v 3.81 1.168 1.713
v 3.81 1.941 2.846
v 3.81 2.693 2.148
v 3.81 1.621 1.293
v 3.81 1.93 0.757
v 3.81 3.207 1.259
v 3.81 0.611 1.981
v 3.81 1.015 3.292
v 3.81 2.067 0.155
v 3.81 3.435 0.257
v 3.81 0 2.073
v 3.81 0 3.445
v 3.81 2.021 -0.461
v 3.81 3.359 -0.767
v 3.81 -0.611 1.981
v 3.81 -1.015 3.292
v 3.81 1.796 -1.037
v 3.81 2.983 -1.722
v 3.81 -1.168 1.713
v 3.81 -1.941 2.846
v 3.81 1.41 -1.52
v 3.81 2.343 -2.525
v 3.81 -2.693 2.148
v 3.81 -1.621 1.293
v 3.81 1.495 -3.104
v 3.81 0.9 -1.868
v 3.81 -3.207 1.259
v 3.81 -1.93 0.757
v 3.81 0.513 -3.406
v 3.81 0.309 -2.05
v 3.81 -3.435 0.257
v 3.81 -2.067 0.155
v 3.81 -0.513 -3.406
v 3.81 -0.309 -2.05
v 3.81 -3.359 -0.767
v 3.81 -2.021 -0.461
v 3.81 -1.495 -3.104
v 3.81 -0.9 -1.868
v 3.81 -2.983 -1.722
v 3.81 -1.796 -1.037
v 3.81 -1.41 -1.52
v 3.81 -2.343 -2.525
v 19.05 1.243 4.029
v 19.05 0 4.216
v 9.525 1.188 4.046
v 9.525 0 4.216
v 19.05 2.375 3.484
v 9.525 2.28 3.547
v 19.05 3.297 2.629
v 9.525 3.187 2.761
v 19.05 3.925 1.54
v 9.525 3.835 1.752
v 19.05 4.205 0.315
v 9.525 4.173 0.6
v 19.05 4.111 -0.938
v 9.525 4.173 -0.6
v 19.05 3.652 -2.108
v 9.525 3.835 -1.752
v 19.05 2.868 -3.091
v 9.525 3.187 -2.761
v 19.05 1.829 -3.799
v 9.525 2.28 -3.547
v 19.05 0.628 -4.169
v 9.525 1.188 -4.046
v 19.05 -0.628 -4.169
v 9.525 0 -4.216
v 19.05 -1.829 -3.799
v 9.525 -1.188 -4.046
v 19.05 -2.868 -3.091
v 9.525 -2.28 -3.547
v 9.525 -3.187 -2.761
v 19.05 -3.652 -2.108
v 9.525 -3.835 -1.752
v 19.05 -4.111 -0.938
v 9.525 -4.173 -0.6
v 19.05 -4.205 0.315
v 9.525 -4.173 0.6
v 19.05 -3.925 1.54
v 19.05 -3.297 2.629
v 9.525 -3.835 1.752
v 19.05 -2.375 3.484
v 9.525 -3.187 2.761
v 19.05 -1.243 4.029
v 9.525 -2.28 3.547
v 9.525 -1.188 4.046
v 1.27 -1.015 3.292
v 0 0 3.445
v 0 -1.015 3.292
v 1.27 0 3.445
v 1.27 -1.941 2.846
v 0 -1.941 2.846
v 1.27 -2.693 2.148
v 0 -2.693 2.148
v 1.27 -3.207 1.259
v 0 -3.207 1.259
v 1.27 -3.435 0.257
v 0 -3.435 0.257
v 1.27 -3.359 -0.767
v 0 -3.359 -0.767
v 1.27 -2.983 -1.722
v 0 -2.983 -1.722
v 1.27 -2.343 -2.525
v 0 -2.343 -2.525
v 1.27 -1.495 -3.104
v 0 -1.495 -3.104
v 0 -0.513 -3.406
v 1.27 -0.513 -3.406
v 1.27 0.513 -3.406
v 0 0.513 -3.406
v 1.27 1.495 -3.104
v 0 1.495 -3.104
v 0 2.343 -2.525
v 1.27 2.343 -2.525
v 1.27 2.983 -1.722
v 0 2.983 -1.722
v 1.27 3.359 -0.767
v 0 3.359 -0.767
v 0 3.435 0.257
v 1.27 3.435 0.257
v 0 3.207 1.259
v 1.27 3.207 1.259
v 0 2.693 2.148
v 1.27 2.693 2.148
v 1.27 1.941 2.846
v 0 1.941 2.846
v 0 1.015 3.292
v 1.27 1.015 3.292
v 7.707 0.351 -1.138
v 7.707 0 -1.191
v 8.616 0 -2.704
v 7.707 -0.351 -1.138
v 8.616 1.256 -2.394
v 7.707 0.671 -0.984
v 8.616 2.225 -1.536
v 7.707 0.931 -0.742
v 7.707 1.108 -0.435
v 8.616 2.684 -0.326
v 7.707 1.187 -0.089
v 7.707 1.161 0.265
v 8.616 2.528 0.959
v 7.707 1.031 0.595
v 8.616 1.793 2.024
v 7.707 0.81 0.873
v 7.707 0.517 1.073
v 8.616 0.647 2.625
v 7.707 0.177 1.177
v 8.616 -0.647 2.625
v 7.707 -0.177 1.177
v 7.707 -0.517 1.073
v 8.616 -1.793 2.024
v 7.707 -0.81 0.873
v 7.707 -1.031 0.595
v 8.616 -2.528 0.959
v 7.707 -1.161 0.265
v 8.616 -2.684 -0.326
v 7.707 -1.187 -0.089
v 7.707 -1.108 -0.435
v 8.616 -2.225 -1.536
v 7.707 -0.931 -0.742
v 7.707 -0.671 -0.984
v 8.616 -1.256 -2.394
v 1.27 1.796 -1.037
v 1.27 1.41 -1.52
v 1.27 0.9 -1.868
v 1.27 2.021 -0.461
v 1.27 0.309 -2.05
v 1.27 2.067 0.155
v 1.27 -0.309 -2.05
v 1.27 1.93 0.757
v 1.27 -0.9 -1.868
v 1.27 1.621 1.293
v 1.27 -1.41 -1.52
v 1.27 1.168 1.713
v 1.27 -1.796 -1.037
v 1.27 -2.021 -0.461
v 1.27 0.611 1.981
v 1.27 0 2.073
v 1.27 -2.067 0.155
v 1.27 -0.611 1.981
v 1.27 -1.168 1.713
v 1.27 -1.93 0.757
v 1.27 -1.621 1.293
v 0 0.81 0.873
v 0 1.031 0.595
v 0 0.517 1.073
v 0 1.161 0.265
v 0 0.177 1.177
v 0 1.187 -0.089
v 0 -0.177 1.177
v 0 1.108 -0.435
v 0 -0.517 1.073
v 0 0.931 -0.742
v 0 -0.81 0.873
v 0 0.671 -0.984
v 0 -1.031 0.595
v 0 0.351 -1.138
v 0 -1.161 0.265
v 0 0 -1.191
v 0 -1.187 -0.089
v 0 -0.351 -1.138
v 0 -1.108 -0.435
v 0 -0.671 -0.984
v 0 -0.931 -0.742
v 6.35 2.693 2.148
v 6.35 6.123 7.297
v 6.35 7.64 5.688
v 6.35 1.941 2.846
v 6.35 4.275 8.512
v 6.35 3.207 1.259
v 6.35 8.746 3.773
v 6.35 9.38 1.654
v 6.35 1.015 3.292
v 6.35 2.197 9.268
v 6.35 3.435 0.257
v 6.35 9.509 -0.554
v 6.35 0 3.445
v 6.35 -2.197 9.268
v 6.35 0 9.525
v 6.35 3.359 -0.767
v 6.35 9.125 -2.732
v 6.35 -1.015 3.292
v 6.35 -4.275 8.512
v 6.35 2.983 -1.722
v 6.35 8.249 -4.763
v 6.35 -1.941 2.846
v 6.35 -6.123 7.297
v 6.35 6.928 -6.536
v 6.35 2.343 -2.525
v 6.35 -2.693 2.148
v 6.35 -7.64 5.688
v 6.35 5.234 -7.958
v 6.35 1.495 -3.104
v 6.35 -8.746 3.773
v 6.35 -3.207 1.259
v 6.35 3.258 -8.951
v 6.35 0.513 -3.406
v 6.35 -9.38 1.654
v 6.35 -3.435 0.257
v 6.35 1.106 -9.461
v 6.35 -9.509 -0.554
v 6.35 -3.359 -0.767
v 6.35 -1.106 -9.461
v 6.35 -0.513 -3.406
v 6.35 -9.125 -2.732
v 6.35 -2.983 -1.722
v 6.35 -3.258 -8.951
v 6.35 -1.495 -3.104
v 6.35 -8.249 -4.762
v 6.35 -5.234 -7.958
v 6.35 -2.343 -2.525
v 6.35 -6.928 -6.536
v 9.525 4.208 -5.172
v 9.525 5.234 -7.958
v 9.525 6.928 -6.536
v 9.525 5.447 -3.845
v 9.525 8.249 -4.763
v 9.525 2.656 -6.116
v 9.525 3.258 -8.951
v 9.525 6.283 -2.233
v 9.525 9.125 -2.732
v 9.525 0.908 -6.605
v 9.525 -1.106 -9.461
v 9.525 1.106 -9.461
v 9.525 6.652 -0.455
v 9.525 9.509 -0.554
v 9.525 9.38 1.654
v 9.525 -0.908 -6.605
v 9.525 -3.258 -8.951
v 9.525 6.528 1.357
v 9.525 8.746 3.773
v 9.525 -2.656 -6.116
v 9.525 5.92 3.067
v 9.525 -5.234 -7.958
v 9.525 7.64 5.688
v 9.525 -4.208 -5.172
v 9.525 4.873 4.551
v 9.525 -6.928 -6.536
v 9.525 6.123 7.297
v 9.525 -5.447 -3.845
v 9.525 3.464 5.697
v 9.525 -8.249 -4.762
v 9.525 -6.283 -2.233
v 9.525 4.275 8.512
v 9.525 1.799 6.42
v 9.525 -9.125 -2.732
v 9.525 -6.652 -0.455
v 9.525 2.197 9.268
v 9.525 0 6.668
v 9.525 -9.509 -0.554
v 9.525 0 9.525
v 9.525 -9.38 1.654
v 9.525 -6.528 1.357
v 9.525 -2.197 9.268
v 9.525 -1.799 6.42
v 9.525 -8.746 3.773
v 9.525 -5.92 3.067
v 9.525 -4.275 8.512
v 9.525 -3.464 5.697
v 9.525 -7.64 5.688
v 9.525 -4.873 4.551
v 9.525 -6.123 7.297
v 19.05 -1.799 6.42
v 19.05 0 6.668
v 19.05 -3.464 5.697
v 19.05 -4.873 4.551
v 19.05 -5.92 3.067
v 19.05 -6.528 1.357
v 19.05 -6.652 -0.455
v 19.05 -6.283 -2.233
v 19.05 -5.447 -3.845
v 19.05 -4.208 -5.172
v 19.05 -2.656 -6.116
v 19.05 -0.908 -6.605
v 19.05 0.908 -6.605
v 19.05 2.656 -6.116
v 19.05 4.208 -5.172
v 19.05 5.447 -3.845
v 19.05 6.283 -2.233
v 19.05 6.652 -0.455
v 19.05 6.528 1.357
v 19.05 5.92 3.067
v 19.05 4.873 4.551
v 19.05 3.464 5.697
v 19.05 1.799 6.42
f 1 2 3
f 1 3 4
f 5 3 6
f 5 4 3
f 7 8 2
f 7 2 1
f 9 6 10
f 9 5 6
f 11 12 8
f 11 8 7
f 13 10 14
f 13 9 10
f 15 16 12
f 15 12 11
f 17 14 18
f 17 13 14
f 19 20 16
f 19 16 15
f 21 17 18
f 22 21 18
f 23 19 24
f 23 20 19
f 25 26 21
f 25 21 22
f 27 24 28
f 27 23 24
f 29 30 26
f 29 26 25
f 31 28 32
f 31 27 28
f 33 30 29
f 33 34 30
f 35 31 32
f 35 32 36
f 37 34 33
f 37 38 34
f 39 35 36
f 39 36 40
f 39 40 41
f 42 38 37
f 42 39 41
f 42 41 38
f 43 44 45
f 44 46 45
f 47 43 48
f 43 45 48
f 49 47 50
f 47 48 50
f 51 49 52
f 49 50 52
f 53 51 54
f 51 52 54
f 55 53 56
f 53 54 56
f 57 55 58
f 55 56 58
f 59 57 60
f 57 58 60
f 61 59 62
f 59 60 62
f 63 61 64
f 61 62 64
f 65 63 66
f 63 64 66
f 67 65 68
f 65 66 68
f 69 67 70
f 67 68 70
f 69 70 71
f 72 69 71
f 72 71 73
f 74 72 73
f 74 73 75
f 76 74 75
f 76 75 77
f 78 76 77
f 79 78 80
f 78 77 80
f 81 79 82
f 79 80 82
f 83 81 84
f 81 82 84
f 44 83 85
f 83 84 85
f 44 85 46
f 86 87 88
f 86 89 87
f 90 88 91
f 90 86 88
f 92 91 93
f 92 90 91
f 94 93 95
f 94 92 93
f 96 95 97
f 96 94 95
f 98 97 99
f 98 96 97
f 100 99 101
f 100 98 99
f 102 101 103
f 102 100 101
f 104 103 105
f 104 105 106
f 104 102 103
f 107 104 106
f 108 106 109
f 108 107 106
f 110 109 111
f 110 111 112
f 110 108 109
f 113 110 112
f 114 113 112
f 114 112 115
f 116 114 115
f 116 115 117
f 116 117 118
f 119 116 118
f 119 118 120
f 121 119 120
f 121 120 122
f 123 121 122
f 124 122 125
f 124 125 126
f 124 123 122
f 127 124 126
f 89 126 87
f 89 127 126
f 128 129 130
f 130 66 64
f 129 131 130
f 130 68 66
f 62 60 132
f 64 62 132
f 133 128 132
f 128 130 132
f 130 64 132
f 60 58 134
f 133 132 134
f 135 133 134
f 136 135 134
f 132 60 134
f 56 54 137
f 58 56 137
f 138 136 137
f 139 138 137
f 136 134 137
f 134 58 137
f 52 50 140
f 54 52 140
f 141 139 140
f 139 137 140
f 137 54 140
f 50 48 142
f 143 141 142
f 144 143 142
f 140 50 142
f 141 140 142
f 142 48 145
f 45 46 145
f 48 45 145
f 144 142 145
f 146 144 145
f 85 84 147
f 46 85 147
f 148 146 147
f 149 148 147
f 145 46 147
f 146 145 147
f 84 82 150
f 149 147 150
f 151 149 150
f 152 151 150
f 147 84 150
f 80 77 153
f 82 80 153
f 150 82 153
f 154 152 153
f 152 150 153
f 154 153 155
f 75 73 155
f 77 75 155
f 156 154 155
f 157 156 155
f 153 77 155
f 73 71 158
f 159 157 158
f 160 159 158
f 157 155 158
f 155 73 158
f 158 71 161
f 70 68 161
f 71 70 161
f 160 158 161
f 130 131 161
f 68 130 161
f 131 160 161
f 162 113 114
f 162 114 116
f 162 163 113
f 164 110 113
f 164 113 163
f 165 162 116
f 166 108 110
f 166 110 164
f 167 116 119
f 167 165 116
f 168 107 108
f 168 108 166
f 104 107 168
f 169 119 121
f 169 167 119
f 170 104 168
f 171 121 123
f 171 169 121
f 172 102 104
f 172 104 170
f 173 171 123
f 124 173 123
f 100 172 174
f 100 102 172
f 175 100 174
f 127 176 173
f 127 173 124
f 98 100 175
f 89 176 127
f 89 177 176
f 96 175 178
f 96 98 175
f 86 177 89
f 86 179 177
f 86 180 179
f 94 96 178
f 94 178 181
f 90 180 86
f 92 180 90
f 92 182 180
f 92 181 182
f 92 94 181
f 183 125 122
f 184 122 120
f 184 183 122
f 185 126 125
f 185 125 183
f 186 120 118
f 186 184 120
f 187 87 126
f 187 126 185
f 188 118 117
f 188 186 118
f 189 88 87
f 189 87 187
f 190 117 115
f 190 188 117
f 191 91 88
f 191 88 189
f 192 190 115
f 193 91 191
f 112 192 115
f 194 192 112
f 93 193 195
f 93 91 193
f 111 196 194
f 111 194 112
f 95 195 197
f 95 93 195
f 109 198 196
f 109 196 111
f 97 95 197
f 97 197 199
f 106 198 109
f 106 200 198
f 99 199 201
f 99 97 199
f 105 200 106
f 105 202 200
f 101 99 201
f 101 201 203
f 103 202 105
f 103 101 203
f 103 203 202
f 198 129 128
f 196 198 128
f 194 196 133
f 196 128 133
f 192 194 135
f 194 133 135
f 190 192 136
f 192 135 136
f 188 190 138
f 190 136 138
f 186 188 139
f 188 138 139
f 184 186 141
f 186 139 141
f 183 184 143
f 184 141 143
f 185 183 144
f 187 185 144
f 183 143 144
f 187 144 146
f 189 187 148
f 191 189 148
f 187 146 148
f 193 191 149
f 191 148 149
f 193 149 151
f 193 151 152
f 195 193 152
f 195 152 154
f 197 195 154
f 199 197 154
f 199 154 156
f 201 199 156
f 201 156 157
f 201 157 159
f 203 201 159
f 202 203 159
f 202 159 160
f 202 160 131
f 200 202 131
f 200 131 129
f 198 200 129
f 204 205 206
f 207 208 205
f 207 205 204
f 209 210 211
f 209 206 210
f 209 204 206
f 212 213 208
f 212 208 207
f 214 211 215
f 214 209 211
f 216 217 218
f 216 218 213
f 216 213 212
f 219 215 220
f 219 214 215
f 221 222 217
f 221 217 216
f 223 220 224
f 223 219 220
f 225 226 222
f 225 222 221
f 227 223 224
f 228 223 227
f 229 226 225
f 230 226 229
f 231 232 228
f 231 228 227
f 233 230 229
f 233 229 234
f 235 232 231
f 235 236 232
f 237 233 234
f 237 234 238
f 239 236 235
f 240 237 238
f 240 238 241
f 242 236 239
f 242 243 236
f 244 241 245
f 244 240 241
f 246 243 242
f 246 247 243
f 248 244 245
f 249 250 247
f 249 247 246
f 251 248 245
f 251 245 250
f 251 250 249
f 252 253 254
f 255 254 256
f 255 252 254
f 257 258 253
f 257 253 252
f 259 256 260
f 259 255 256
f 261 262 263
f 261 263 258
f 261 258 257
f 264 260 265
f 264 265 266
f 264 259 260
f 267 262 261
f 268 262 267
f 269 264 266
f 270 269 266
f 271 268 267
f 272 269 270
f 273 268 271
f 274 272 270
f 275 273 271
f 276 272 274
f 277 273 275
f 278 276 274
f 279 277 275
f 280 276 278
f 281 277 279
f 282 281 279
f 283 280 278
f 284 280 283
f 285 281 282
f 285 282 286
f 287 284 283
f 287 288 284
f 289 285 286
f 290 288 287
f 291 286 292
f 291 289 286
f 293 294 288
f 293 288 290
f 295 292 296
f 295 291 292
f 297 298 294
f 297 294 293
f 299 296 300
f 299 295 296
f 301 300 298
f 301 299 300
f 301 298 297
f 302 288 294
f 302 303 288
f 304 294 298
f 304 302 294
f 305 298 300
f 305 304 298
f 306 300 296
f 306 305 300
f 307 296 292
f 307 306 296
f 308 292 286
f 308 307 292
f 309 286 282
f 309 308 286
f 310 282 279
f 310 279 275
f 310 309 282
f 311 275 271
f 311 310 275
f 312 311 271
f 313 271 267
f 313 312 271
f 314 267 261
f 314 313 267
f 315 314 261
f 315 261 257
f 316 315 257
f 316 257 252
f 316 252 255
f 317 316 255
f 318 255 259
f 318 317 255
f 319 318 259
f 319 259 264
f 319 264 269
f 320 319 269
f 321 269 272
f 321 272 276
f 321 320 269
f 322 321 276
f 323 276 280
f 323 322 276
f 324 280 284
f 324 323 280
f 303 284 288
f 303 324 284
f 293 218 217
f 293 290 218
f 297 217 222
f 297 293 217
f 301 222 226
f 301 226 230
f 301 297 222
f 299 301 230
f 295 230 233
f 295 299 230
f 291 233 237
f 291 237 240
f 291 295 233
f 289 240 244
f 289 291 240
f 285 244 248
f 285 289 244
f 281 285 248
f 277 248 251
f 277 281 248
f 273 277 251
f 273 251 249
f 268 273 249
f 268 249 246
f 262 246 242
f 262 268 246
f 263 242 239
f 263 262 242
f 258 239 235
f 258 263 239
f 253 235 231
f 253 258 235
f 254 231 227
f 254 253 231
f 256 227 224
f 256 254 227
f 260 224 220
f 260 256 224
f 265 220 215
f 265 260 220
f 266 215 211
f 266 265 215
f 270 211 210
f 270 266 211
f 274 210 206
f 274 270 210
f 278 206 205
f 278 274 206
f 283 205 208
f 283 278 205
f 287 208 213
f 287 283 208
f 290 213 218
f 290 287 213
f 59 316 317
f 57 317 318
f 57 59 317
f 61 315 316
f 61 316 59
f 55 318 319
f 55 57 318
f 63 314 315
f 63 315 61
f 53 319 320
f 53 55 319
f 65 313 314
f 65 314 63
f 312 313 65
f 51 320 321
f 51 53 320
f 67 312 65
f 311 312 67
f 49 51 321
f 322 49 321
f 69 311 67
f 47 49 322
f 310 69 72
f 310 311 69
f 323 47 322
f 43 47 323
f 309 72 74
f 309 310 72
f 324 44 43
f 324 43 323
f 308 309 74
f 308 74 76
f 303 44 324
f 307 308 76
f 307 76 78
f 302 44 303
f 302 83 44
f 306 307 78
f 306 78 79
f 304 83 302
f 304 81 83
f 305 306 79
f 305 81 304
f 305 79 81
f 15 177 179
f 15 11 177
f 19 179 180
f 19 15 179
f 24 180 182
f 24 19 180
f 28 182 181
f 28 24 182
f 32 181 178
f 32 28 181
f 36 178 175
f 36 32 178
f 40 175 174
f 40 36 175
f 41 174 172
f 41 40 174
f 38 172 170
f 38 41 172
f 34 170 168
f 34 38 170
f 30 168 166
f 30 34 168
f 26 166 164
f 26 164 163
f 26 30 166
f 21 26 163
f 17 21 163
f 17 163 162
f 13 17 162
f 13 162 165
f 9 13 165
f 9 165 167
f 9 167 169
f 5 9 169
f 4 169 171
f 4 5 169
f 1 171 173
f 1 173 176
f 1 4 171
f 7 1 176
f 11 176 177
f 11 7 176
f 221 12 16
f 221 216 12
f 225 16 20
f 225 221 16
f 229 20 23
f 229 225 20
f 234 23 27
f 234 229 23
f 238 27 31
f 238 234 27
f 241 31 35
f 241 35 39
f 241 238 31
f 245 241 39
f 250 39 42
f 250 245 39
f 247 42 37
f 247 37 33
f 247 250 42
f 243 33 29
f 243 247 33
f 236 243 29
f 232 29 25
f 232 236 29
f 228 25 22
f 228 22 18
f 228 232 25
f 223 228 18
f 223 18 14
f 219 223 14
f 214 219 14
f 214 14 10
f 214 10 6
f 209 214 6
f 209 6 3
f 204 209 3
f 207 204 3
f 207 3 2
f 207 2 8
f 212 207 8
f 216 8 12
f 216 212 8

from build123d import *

# Parameters (mm, degrees)
PIPE_TAP_DRILL_FOR_1_8_TAP1_D       = 8.4328
PIPE_TAP_DRILL_FOR_1_8_TAP1_DEPTH   = 9.525
PIPE_TAP_DRILL_FOR_1_8_TAP1_TIP     = 2.533468714
F_3_32_0_09375_DIAMETER_HOLE2_D     = 2.38125
F_3_32_0_09375_DIAMETER_HOLE2_DEPTH = 12.7
F_3_32_0_09375_DIAMETER_HOLE2_TIP   = 0.715399675


with BuildPart() as part:
    # Sketch1 → Revolve1 (revolve)
    with BuildSketch(Plane.XY, mode=Mode.PRIVATE) as revolve1_sk:
        Polygon((6.35, 3.444875), (6.35, 9.525), (9.525, 9.525), (9.525, 6.6675), (19.05, 6.6675), (19.05, 0), (0, 0), (0, 3.444875), (1.27, 3.444875), (1.27, 2.073275), (3.81, 2.073275), (3.81, 3.444875), align=None)
    revolve(revolve1_sk.sketch.rotate(Axis((0, 0, 0), (1, 0, 0)), 90), axis=Axis((0, 0, 0), (1, 0, 0)))

    # Pipe Tap Drill for 1/8 Tap1
    with Locations(Plane(origin=(19.05, 0, 0), x_dir=(0, 0, -1), z_dir=(1, 0, 0))):
        with Locations((0, 0)):
            Hole(PIPE_TAP_DRILL_FOR_1_8_TAP1_D / 2, depth=PIPE_TAP_DRILL_FOR_1_8_TAP1_DEPTH)
            with Locations((0, 0, -(PIPE_TAP_DRILL_FOR_1_8_TAP1_DEPTH + PIPE_TAP_DRILL_FOR_1_8_TAP1_TIP / 2))):  # 118° drill point
                Cone(0, PIPE_TAP_DRILL_FOR_1_8_TAP1_D / 2, PIPE_TAP_DRILL_FOR_1_8_TAP1_TIP, mode=Mode.SUBTRACT)

    # 3/32 (0.09375) Diameter Hole2
    with Locations(Plane.ZY):
        with Locations((0, 0)):
            Hole(F_3_32_0_09375_DIAMETER_HOLE2_D / 2, depth=F_3_32_0_09375_DIAMETER_HOLE2_DEPTH)
            with Locations((0, 0, -(F_3_32_0_09375_DIAMETER_HOLE2_DEPTH + F_3_32_0_09375_DIAMETER_HOLE2_TIP / 2))):  # 118° drill point
                Cone(0, F_3_32_0_09375_DIAMETER_HOLE2_D / 2, F_3_32_0_09375_DIAMETER_HOLE2_TIP, mode=Mode.SUBTRACT)


solid = part.part
